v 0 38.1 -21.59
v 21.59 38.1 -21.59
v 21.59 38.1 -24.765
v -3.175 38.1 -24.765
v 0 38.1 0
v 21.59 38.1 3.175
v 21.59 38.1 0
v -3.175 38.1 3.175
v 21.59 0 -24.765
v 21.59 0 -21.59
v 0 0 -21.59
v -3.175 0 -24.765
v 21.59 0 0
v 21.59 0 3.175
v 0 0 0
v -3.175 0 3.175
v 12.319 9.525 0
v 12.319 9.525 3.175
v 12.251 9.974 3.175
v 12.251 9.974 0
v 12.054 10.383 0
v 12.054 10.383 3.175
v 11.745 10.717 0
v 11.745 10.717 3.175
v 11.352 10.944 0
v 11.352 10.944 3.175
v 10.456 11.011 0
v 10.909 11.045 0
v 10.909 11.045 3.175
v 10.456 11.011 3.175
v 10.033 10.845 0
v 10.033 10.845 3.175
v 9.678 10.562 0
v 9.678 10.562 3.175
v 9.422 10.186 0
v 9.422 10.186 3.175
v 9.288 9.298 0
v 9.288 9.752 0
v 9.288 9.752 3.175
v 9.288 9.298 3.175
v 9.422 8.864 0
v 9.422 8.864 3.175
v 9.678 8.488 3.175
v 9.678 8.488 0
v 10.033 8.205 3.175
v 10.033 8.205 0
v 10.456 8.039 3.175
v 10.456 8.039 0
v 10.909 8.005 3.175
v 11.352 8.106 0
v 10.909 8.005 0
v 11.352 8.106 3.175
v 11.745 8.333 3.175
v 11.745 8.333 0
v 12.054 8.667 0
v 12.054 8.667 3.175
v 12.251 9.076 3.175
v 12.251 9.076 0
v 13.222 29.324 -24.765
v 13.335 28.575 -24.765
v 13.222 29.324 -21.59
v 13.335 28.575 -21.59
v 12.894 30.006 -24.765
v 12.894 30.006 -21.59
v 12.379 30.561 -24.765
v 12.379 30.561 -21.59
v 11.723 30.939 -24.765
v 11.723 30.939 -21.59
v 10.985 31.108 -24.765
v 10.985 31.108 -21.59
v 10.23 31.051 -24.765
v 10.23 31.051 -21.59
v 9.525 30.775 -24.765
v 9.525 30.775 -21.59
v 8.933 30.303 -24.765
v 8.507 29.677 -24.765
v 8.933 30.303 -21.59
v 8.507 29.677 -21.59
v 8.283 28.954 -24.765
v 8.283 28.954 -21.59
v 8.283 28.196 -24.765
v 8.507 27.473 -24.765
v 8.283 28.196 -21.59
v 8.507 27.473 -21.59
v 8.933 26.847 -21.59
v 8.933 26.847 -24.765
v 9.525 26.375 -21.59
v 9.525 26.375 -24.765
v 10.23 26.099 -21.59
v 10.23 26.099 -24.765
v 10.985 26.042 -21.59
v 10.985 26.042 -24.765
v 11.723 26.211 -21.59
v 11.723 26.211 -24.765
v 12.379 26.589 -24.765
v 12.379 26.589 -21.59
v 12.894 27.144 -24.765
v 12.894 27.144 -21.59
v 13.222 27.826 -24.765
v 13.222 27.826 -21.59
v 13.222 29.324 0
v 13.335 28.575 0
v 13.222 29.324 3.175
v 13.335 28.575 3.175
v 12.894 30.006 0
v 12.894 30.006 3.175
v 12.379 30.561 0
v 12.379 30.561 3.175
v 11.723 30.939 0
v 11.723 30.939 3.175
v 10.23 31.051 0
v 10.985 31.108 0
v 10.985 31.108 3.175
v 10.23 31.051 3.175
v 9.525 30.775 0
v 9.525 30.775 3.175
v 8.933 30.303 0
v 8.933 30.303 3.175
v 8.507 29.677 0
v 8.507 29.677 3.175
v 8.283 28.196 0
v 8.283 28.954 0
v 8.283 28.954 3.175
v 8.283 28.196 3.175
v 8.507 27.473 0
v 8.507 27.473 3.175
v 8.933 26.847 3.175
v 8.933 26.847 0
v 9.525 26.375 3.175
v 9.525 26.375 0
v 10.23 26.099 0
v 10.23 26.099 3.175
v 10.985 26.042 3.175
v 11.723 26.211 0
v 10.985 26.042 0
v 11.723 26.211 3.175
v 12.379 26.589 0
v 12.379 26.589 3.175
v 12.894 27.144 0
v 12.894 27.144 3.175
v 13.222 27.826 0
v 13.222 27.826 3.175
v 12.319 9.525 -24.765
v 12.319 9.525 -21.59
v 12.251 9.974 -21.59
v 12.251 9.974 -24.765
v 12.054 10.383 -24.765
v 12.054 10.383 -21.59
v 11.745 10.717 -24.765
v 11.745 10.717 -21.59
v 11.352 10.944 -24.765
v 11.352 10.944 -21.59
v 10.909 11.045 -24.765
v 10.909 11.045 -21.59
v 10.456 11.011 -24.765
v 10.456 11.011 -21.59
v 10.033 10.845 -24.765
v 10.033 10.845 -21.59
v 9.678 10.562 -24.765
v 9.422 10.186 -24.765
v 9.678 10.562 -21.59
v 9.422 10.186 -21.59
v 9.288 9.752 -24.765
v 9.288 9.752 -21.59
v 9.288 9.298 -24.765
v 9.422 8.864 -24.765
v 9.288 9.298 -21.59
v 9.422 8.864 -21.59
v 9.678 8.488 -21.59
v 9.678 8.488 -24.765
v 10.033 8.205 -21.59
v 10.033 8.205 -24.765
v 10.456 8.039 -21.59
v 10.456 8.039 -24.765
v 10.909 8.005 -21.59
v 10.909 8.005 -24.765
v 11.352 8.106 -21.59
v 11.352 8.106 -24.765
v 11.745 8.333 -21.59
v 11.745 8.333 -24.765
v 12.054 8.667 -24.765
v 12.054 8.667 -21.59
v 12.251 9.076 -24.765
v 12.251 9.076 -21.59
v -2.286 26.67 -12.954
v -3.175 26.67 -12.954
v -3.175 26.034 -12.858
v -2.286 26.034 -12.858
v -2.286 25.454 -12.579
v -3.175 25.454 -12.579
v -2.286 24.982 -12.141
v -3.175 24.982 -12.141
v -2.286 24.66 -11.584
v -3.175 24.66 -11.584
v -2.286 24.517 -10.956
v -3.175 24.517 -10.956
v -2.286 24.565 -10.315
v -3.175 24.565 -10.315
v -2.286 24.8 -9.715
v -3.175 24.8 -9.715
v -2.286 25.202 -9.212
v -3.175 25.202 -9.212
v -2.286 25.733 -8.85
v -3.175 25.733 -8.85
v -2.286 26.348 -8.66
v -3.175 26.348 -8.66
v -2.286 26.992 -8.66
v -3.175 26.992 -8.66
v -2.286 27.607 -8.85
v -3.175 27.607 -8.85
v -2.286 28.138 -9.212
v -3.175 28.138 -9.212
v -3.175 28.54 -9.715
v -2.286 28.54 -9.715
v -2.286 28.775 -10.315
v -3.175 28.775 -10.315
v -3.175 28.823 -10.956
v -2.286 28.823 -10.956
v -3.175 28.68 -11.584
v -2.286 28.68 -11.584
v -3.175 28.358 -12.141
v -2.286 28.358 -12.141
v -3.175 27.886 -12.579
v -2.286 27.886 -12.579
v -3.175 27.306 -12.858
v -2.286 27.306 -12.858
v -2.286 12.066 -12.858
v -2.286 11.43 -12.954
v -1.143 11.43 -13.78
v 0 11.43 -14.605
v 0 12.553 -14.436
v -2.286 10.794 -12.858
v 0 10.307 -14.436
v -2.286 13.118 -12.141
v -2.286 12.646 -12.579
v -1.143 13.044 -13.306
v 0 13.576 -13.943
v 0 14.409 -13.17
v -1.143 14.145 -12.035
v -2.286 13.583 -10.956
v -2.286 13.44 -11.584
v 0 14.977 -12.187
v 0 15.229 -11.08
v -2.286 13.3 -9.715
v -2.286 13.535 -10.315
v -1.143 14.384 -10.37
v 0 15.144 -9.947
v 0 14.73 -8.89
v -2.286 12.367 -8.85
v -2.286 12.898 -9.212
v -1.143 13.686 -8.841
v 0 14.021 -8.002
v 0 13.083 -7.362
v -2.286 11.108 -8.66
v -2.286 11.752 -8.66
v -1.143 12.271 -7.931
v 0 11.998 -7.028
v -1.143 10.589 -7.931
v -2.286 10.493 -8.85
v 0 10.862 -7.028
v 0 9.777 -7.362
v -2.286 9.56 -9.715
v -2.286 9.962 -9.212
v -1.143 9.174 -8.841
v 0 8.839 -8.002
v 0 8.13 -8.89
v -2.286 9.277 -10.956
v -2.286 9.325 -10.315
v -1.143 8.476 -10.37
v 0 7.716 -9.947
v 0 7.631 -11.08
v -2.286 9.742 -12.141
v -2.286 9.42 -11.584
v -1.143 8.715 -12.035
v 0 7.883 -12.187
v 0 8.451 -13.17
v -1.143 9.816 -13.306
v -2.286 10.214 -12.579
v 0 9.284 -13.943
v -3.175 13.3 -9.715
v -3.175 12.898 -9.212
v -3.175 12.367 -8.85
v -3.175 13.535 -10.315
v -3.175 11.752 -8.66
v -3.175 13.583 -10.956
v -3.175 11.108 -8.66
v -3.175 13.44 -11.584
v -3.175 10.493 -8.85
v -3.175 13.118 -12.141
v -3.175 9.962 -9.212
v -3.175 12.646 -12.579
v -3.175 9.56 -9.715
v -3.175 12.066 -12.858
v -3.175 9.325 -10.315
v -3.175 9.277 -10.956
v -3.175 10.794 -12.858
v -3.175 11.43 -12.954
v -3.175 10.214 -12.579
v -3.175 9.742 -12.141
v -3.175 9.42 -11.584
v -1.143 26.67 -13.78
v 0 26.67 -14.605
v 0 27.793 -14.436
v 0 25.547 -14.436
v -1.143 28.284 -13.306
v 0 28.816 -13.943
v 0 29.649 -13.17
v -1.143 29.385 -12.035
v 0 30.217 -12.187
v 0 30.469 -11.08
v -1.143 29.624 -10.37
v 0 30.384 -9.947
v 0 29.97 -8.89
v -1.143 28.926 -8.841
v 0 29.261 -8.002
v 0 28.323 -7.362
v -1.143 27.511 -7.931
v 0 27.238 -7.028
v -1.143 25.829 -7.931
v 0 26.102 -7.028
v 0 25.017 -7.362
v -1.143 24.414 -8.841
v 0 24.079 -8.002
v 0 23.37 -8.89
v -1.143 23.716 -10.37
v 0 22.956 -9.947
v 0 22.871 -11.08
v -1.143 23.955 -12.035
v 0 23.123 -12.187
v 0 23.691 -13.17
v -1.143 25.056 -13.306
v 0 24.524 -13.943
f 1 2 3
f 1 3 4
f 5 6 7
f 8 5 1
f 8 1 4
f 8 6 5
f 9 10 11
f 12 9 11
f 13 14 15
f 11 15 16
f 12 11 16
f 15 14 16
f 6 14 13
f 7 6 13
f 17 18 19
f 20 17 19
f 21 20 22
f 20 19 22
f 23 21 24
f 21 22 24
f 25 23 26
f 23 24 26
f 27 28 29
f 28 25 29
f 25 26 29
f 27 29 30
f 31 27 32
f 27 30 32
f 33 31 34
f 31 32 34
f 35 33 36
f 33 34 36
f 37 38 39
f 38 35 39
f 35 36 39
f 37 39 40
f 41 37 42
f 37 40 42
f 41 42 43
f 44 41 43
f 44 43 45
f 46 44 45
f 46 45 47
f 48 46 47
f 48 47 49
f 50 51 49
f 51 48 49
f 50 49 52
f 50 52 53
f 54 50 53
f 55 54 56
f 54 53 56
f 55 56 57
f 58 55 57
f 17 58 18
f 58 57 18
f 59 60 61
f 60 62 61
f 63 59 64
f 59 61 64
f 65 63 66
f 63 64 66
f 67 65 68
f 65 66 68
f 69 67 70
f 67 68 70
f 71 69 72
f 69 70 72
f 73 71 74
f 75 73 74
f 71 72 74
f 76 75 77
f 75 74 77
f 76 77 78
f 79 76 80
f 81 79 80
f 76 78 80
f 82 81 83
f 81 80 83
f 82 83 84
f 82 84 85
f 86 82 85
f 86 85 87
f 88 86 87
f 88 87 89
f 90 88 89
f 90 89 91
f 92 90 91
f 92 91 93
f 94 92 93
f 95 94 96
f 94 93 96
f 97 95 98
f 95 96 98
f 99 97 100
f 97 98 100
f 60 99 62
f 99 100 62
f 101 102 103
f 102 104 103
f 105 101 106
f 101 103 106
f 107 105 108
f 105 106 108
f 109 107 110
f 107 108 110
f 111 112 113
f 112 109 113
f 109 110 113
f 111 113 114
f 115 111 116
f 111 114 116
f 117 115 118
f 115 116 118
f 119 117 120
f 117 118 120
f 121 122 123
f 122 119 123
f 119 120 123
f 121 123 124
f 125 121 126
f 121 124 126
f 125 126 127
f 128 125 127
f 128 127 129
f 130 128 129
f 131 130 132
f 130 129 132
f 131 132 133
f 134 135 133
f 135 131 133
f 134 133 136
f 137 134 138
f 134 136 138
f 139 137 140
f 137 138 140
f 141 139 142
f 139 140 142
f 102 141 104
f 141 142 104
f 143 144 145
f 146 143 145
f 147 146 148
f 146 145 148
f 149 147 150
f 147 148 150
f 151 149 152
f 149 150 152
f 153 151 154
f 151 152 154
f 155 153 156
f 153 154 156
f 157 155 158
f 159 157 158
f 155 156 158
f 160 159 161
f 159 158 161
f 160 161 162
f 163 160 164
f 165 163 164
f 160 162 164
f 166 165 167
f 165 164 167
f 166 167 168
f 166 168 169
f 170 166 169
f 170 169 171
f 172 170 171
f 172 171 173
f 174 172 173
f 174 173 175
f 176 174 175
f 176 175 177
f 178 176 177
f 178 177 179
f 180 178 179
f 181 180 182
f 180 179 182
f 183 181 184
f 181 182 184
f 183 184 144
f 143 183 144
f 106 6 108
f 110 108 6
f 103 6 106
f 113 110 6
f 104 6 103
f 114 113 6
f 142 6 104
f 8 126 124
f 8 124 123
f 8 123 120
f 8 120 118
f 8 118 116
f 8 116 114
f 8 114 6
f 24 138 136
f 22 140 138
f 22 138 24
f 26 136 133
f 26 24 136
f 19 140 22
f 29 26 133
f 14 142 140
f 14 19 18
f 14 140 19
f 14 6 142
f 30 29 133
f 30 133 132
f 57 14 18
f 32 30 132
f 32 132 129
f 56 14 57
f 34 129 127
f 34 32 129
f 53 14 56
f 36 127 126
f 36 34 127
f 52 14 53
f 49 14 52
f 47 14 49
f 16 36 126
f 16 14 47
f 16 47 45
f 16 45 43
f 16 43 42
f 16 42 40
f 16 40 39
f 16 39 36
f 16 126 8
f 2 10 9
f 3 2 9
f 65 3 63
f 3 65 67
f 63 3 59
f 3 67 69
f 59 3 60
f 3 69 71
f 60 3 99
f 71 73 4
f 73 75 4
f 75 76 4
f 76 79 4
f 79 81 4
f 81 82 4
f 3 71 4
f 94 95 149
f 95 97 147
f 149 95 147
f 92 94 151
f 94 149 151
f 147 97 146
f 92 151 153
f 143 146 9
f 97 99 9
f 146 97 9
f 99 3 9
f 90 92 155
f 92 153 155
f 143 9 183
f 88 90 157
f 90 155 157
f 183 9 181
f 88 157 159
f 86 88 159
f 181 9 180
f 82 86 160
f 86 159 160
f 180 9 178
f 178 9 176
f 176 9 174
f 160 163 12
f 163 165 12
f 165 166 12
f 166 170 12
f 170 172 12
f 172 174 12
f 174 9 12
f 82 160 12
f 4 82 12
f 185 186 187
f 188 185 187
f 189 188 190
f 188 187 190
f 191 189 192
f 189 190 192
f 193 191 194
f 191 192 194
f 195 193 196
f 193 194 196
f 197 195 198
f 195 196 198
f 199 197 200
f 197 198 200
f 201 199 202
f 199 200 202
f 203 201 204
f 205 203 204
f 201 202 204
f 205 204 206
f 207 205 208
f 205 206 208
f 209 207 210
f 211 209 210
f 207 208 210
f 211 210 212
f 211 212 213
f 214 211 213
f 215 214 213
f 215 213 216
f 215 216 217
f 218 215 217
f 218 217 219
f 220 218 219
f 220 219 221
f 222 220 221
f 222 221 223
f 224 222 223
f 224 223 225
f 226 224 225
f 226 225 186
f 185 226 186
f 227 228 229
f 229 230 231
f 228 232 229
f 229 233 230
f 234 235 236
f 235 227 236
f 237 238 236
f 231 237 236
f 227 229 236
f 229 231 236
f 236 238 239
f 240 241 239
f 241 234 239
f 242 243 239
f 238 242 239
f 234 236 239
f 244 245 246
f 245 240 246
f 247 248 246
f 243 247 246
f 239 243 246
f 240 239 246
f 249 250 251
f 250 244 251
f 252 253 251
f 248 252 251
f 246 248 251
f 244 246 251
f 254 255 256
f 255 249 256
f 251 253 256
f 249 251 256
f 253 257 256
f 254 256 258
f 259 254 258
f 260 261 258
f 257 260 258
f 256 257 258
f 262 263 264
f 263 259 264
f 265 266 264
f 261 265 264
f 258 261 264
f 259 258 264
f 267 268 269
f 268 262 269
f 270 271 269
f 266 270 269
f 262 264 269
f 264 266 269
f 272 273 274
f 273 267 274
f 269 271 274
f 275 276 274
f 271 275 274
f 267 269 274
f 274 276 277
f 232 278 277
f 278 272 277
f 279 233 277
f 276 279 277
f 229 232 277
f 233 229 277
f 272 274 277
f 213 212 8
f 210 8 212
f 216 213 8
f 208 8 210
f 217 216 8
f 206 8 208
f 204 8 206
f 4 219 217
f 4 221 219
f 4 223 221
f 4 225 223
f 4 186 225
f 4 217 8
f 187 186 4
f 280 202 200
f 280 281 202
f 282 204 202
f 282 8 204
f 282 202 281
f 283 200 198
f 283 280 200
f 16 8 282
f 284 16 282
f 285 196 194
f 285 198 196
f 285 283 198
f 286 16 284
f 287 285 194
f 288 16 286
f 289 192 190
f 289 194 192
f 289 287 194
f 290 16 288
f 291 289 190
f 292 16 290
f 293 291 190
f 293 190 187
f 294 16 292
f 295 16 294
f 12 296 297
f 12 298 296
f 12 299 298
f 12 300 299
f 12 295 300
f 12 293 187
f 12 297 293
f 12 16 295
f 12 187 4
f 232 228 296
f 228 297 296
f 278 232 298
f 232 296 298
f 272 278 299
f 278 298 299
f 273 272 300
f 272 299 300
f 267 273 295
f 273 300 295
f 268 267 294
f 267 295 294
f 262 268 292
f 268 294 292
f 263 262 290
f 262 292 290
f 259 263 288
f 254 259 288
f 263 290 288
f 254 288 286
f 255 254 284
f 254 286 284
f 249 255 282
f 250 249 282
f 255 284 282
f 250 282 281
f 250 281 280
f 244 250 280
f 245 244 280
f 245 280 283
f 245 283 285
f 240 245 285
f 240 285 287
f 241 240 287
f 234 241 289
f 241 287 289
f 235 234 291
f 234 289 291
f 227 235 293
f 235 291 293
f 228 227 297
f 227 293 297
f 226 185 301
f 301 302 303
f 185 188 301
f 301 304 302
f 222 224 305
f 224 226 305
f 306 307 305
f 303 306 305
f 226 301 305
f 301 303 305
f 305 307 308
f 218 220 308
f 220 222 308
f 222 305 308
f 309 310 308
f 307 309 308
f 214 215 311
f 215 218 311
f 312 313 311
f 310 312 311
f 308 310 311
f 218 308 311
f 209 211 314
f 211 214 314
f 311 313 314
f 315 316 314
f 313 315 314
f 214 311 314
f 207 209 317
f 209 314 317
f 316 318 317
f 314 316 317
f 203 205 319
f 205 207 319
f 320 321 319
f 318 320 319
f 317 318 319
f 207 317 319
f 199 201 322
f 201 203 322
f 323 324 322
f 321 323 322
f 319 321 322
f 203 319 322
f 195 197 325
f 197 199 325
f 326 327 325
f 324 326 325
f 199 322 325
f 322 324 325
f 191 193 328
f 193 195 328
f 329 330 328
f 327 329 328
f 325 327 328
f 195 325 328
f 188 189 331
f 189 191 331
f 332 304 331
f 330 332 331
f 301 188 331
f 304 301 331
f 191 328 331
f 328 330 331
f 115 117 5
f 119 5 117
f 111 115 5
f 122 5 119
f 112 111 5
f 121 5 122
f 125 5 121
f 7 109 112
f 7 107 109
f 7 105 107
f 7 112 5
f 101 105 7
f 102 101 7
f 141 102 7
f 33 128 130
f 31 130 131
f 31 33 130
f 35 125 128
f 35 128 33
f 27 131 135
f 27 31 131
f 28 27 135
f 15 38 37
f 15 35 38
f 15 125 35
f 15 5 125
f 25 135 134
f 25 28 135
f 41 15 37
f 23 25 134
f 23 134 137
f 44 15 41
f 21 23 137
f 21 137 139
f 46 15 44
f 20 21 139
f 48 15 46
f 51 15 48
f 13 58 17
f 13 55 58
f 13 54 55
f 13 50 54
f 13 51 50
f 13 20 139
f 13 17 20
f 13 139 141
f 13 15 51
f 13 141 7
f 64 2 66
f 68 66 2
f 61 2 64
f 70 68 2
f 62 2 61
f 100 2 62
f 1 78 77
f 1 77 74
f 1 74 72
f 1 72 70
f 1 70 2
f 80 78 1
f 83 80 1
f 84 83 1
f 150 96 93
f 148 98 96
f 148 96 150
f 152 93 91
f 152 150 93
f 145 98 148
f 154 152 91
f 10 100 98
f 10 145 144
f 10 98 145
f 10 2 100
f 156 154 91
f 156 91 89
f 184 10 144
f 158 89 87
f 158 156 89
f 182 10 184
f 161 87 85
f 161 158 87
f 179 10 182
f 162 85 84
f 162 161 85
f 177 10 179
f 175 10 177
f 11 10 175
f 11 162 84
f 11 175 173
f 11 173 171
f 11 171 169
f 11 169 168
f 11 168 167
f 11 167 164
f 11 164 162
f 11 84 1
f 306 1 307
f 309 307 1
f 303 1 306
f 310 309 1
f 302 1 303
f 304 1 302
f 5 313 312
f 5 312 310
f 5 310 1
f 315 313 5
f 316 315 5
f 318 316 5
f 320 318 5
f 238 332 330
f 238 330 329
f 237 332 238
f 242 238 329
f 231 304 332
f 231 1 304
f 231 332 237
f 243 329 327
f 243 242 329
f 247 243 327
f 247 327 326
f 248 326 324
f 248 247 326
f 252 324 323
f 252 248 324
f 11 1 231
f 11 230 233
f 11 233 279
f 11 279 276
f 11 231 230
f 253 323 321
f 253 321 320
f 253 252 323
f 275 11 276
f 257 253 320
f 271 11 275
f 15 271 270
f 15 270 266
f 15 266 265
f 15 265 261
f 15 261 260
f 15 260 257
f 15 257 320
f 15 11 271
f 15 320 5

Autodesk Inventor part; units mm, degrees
ref_plane "YZ Plane" through (0, 0, 0) normal (1, 0, 0) x (0, 1, 0)
ref_plane "XZ Plane" through (0, 0, 0) normal (0, 1, 0) x (-1, 0, 0)
ref_plane "XY Plane" through (0, 0, 0) normal (0, 0, 1) x (1, 0, 0)
sketch "Sketch1" plane through (0, 0, 0) normal (0, 1, 0) x (-1, 0, 0)
  line L0 (0, 0) -> (-21.59, 0)
  line L1 (-21.59, 0) -> (-21.59, -21.59)
  line L2 (-21.59, -21.59) -> (0, -21.59)
  line L3 (0, -21.59) -> (0, 0)
  line L4 (-21.59, 0) -> (0, 0)
  line L5 (0, 0) -> (0, 3.175)
  line L6 (0, 3.175) -> (-21.59, 3.175)
  line L7 (-21.59, 3.175) -> (-21.59, 0)
  line L8 (0, 3.175) -> (3.175, 3.175)
  line L9 (3.175, 3.175) -> (3.175, -21.59)
  line L10 (3.175, -21.59) -> (0, -21.59)
  line L11 (0, -21.59) -> (0, 3.175)
  line L12 (3.175, -21.59) -> (-21.59, -21.59)
  line L13 (-21.59, -21.59) -> (-21.59, -24.765)
  line L14 (-21.59, -24.765) -> (3.175, -24.765)
  line L15 (3.175, -24.765) -> (3.175, -21.59)
  dimension "d0" = 21.59
  dimension "d1" = 21.59
  dimension "d2" = 3.175
  dimension "d3" = 3.175
extrude "Extrusion1" add sketch "Sketch1" along normal blind 38.1 contours L5 L8 L9 L10 L3 | L0 L7 L6 L5 | L10 L15 L14 L13 L2
sketch "Sketch2" plane through (0, 0, 0) normal (1, 0, 0) x (0, 0, -1)
  line L0 (0, 0) -> (21.59, 0) projected
  line L1 (10.795, 0) -> (10.795, 11.43)
  line L2 (10.795, 0) -> (22.225, 0) construction
  line L3 (0, 38.1) -> (21.59, 38.1) projected
  line L4 (10.795, 38.1) -> (10.795, 26.67)
  line L5 (10.795, 38.1) -> (22.225, 38.1) construction
  circle A0 centre (10.795, 26.67) radius 2.159
  circle A1 centre (10.795, 11.43) radius 2.159
  dimension "d6" = 11.43
  dimension "d7" = 90
  dimension "d8" = 11.43
  dimension "d9" = 90
  dimension "d10" = 15.24
  dimension "d11" = 4.318
  dimension "d12" = 4.318
hole "Hole1" at (0, 26.67, -10.795) at (0, 11.43, -10.795) direction (-1, 0, 0) diameter 4.318 depth 25.4
sketch "Sketch3" plane through (-3.175, 0, 3.175) normal (0, 0, 1) x (1, 0, 0)
  line L0 (3.175, 38.1) -> (24.765, 38.1) projected
  line L1 (13.97, 38.1) -> (13.97, 28.575)
  circle A0 centre (13.97, 28.575) radius 2.54
  point P0 (3.175, 0)
  dimension "d20" = 9.525
  dimension "d21" = 5.08
extrude "Extrusion2" cut sketch "Sketch3" against normal blind 38.1
sketch "Sketch4" plane through (-3.175, 0, 3.175) normal (0, 0, 1) x (1, 0, 0)
  line L0 (24.765, 0) -> (3.175, 0) projected
  line L1 (13.97, 0) -> (13.97, 9.525)
  circle A0 centre (13.97, 9.525) radius 1.524
  dimension "d25" = 9.525
  dimension "d26" = 3.048
extrude "Extrusion3" cut sketch "Sketch4" against normal blind 38.1
chamfer "Chamfer1" distance 1.651 distance2 2.286 1 edges at (0, 26.67, -8.636) measured on face at (0, 21.4178, -2.8996)
chamfer "Chamfer2" distance 1.651 distance2 2.286 1 edges at (0, 11.43, -8.636) measured on face at (0, 21.2861, -2.3652)
properties part number "Silder Mount V1"
